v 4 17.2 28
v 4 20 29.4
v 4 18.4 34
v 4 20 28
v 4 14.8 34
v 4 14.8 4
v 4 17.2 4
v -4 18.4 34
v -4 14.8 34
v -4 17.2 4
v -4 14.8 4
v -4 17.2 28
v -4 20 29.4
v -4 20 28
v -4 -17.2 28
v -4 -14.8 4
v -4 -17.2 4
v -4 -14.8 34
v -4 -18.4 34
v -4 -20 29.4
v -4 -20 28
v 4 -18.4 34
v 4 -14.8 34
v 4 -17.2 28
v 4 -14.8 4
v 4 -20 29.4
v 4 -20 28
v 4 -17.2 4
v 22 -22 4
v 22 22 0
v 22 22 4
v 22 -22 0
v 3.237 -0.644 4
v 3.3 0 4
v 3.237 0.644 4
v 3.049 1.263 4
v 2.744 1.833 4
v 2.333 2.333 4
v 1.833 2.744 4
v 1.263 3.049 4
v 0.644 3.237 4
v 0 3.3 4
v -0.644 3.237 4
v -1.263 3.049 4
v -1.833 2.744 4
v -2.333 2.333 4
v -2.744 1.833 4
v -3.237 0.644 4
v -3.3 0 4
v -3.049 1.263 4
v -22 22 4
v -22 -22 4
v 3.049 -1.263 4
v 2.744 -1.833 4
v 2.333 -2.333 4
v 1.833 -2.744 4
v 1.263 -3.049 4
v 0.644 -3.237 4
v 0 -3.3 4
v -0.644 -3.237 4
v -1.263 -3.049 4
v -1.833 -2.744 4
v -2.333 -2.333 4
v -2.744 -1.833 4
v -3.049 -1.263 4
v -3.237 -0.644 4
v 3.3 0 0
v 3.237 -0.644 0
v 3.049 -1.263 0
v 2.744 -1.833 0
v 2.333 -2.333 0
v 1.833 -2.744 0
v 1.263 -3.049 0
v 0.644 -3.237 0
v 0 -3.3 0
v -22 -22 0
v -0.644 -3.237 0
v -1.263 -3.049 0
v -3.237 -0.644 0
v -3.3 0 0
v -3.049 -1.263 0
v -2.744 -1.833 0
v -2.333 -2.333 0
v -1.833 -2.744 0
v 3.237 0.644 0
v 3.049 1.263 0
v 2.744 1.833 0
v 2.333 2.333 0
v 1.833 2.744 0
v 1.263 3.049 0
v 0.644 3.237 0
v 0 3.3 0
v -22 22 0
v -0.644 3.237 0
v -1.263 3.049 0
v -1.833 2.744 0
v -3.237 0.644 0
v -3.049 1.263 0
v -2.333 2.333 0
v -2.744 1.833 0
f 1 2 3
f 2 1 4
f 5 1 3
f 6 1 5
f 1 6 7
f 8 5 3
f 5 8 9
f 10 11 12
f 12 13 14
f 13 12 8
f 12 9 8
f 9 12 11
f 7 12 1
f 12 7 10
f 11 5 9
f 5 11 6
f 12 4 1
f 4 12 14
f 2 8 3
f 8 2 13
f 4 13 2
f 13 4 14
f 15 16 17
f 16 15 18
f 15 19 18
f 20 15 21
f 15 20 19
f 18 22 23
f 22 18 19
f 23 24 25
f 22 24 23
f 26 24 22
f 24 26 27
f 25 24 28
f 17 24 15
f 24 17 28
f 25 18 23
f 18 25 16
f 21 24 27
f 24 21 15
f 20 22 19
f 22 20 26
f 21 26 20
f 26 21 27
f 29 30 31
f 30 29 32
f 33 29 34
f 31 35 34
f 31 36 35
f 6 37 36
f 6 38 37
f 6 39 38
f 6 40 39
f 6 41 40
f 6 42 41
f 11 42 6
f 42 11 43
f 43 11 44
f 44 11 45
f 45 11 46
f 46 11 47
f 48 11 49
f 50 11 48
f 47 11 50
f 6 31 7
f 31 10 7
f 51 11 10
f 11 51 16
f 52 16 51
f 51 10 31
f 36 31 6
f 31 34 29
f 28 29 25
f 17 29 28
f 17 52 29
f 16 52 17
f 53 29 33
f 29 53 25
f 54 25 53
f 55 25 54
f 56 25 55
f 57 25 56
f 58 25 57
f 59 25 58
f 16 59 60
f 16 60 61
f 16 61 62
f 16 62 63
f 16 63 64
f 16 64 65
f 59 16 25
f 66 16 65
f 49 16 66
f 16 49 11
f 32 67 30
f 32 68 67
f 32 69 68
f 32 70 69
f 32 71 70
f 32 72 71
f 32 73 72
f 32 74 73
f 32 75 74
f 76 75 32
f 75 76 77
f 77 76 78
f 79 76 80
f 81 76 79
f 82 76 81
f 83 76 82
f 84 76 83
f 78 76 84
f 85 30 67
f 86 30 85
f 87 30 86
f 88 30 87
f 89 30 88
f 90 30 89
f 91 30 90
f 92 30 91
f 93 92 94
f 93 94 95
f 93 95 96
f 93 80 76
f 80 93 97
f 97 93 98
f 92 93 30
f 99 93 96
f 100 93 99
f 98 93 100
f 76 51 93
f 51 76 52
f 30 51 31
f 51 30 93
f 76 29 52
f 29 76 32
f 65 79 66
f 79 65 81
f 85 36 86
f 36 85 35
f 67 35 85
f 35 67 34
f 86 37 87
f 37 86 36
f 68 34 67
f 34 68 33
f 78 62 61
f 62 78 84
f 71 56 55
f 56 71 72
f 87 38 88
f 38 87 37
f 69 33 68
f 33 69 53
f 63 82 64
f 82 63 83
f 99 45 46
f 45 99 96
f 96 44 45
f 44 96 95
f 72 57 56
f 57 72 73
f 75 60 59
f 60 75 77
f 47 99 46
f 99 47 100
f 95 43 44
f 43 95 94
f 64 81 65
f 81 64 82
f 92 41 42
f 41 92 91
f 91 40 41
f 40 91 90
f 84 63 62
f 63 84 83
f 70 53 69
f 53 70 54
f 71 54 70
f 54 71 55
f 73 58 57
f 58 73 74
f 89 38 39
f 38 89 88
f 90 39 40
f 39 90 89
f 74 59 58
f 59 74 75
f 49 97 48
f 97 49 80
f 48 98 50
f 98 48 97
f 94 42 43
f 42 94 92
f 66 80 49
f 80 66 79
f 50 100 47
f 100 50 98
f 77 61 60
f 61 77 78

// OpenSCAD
$fn = 32;

// ----------------------------------------------------------------------
// Snap-fit latch: 2 arms, 30 mm tall, 3 mm undercut hooks
// ----------------------------------------------------------------------

// --- parameters (mm) ---
base_d = 44;              // base plate depth
base_h = 4;               // base plate thickness
span = 32;                // distance between opposite arms
arm_t = 2.4;              // arm thickness
arm_d = 8;                // arm width
height = 30;              // free arm length
head_len = 3;             // hook reach
head_h = 6;               // hook height
lead = 1.4;               // lead-in ramp thickness
bore_d = 6.6;             // base fixing bore
top_z = 34;               // height of the arm tips above the base

arms = 2;

difference() {
  union() {
    /* base plate, centred on the arm ring */
    translate([-22, -22, 0]) cube([base_d, base_d, base_h]);
    for (a = [0 : 360 / arms : 359]) rotate([0, 0, a]) {
    /* arm, sunk 0.5 mm into the base */
    translate([-arm_d / 2, span / 2 - arm_t / 2, base_h - 0.5]) cube([arm_d, arm_t, height + 0.5]);
    /* hook: a convex hull of a tall inner block and a thin outer lip
       gives a flat undercut below and a lead-in ramp on top */
    hull() {
      translate([-arm_d / 2, span / 2 + arm_t / 2 - 0.6, top_z - head_h]) cube([arm_d, lead + 0.4, head_h]);
      translate([-arm_d / 2, span / 2 + arm_t / 2 - 0.2, top_z - head_h]) cube([arm_d, head_len, lead]);
    }
    }
  }
  translate([0, 0, -2.5]) cylinder(h = base_h + 5, d = bore_d);
}
